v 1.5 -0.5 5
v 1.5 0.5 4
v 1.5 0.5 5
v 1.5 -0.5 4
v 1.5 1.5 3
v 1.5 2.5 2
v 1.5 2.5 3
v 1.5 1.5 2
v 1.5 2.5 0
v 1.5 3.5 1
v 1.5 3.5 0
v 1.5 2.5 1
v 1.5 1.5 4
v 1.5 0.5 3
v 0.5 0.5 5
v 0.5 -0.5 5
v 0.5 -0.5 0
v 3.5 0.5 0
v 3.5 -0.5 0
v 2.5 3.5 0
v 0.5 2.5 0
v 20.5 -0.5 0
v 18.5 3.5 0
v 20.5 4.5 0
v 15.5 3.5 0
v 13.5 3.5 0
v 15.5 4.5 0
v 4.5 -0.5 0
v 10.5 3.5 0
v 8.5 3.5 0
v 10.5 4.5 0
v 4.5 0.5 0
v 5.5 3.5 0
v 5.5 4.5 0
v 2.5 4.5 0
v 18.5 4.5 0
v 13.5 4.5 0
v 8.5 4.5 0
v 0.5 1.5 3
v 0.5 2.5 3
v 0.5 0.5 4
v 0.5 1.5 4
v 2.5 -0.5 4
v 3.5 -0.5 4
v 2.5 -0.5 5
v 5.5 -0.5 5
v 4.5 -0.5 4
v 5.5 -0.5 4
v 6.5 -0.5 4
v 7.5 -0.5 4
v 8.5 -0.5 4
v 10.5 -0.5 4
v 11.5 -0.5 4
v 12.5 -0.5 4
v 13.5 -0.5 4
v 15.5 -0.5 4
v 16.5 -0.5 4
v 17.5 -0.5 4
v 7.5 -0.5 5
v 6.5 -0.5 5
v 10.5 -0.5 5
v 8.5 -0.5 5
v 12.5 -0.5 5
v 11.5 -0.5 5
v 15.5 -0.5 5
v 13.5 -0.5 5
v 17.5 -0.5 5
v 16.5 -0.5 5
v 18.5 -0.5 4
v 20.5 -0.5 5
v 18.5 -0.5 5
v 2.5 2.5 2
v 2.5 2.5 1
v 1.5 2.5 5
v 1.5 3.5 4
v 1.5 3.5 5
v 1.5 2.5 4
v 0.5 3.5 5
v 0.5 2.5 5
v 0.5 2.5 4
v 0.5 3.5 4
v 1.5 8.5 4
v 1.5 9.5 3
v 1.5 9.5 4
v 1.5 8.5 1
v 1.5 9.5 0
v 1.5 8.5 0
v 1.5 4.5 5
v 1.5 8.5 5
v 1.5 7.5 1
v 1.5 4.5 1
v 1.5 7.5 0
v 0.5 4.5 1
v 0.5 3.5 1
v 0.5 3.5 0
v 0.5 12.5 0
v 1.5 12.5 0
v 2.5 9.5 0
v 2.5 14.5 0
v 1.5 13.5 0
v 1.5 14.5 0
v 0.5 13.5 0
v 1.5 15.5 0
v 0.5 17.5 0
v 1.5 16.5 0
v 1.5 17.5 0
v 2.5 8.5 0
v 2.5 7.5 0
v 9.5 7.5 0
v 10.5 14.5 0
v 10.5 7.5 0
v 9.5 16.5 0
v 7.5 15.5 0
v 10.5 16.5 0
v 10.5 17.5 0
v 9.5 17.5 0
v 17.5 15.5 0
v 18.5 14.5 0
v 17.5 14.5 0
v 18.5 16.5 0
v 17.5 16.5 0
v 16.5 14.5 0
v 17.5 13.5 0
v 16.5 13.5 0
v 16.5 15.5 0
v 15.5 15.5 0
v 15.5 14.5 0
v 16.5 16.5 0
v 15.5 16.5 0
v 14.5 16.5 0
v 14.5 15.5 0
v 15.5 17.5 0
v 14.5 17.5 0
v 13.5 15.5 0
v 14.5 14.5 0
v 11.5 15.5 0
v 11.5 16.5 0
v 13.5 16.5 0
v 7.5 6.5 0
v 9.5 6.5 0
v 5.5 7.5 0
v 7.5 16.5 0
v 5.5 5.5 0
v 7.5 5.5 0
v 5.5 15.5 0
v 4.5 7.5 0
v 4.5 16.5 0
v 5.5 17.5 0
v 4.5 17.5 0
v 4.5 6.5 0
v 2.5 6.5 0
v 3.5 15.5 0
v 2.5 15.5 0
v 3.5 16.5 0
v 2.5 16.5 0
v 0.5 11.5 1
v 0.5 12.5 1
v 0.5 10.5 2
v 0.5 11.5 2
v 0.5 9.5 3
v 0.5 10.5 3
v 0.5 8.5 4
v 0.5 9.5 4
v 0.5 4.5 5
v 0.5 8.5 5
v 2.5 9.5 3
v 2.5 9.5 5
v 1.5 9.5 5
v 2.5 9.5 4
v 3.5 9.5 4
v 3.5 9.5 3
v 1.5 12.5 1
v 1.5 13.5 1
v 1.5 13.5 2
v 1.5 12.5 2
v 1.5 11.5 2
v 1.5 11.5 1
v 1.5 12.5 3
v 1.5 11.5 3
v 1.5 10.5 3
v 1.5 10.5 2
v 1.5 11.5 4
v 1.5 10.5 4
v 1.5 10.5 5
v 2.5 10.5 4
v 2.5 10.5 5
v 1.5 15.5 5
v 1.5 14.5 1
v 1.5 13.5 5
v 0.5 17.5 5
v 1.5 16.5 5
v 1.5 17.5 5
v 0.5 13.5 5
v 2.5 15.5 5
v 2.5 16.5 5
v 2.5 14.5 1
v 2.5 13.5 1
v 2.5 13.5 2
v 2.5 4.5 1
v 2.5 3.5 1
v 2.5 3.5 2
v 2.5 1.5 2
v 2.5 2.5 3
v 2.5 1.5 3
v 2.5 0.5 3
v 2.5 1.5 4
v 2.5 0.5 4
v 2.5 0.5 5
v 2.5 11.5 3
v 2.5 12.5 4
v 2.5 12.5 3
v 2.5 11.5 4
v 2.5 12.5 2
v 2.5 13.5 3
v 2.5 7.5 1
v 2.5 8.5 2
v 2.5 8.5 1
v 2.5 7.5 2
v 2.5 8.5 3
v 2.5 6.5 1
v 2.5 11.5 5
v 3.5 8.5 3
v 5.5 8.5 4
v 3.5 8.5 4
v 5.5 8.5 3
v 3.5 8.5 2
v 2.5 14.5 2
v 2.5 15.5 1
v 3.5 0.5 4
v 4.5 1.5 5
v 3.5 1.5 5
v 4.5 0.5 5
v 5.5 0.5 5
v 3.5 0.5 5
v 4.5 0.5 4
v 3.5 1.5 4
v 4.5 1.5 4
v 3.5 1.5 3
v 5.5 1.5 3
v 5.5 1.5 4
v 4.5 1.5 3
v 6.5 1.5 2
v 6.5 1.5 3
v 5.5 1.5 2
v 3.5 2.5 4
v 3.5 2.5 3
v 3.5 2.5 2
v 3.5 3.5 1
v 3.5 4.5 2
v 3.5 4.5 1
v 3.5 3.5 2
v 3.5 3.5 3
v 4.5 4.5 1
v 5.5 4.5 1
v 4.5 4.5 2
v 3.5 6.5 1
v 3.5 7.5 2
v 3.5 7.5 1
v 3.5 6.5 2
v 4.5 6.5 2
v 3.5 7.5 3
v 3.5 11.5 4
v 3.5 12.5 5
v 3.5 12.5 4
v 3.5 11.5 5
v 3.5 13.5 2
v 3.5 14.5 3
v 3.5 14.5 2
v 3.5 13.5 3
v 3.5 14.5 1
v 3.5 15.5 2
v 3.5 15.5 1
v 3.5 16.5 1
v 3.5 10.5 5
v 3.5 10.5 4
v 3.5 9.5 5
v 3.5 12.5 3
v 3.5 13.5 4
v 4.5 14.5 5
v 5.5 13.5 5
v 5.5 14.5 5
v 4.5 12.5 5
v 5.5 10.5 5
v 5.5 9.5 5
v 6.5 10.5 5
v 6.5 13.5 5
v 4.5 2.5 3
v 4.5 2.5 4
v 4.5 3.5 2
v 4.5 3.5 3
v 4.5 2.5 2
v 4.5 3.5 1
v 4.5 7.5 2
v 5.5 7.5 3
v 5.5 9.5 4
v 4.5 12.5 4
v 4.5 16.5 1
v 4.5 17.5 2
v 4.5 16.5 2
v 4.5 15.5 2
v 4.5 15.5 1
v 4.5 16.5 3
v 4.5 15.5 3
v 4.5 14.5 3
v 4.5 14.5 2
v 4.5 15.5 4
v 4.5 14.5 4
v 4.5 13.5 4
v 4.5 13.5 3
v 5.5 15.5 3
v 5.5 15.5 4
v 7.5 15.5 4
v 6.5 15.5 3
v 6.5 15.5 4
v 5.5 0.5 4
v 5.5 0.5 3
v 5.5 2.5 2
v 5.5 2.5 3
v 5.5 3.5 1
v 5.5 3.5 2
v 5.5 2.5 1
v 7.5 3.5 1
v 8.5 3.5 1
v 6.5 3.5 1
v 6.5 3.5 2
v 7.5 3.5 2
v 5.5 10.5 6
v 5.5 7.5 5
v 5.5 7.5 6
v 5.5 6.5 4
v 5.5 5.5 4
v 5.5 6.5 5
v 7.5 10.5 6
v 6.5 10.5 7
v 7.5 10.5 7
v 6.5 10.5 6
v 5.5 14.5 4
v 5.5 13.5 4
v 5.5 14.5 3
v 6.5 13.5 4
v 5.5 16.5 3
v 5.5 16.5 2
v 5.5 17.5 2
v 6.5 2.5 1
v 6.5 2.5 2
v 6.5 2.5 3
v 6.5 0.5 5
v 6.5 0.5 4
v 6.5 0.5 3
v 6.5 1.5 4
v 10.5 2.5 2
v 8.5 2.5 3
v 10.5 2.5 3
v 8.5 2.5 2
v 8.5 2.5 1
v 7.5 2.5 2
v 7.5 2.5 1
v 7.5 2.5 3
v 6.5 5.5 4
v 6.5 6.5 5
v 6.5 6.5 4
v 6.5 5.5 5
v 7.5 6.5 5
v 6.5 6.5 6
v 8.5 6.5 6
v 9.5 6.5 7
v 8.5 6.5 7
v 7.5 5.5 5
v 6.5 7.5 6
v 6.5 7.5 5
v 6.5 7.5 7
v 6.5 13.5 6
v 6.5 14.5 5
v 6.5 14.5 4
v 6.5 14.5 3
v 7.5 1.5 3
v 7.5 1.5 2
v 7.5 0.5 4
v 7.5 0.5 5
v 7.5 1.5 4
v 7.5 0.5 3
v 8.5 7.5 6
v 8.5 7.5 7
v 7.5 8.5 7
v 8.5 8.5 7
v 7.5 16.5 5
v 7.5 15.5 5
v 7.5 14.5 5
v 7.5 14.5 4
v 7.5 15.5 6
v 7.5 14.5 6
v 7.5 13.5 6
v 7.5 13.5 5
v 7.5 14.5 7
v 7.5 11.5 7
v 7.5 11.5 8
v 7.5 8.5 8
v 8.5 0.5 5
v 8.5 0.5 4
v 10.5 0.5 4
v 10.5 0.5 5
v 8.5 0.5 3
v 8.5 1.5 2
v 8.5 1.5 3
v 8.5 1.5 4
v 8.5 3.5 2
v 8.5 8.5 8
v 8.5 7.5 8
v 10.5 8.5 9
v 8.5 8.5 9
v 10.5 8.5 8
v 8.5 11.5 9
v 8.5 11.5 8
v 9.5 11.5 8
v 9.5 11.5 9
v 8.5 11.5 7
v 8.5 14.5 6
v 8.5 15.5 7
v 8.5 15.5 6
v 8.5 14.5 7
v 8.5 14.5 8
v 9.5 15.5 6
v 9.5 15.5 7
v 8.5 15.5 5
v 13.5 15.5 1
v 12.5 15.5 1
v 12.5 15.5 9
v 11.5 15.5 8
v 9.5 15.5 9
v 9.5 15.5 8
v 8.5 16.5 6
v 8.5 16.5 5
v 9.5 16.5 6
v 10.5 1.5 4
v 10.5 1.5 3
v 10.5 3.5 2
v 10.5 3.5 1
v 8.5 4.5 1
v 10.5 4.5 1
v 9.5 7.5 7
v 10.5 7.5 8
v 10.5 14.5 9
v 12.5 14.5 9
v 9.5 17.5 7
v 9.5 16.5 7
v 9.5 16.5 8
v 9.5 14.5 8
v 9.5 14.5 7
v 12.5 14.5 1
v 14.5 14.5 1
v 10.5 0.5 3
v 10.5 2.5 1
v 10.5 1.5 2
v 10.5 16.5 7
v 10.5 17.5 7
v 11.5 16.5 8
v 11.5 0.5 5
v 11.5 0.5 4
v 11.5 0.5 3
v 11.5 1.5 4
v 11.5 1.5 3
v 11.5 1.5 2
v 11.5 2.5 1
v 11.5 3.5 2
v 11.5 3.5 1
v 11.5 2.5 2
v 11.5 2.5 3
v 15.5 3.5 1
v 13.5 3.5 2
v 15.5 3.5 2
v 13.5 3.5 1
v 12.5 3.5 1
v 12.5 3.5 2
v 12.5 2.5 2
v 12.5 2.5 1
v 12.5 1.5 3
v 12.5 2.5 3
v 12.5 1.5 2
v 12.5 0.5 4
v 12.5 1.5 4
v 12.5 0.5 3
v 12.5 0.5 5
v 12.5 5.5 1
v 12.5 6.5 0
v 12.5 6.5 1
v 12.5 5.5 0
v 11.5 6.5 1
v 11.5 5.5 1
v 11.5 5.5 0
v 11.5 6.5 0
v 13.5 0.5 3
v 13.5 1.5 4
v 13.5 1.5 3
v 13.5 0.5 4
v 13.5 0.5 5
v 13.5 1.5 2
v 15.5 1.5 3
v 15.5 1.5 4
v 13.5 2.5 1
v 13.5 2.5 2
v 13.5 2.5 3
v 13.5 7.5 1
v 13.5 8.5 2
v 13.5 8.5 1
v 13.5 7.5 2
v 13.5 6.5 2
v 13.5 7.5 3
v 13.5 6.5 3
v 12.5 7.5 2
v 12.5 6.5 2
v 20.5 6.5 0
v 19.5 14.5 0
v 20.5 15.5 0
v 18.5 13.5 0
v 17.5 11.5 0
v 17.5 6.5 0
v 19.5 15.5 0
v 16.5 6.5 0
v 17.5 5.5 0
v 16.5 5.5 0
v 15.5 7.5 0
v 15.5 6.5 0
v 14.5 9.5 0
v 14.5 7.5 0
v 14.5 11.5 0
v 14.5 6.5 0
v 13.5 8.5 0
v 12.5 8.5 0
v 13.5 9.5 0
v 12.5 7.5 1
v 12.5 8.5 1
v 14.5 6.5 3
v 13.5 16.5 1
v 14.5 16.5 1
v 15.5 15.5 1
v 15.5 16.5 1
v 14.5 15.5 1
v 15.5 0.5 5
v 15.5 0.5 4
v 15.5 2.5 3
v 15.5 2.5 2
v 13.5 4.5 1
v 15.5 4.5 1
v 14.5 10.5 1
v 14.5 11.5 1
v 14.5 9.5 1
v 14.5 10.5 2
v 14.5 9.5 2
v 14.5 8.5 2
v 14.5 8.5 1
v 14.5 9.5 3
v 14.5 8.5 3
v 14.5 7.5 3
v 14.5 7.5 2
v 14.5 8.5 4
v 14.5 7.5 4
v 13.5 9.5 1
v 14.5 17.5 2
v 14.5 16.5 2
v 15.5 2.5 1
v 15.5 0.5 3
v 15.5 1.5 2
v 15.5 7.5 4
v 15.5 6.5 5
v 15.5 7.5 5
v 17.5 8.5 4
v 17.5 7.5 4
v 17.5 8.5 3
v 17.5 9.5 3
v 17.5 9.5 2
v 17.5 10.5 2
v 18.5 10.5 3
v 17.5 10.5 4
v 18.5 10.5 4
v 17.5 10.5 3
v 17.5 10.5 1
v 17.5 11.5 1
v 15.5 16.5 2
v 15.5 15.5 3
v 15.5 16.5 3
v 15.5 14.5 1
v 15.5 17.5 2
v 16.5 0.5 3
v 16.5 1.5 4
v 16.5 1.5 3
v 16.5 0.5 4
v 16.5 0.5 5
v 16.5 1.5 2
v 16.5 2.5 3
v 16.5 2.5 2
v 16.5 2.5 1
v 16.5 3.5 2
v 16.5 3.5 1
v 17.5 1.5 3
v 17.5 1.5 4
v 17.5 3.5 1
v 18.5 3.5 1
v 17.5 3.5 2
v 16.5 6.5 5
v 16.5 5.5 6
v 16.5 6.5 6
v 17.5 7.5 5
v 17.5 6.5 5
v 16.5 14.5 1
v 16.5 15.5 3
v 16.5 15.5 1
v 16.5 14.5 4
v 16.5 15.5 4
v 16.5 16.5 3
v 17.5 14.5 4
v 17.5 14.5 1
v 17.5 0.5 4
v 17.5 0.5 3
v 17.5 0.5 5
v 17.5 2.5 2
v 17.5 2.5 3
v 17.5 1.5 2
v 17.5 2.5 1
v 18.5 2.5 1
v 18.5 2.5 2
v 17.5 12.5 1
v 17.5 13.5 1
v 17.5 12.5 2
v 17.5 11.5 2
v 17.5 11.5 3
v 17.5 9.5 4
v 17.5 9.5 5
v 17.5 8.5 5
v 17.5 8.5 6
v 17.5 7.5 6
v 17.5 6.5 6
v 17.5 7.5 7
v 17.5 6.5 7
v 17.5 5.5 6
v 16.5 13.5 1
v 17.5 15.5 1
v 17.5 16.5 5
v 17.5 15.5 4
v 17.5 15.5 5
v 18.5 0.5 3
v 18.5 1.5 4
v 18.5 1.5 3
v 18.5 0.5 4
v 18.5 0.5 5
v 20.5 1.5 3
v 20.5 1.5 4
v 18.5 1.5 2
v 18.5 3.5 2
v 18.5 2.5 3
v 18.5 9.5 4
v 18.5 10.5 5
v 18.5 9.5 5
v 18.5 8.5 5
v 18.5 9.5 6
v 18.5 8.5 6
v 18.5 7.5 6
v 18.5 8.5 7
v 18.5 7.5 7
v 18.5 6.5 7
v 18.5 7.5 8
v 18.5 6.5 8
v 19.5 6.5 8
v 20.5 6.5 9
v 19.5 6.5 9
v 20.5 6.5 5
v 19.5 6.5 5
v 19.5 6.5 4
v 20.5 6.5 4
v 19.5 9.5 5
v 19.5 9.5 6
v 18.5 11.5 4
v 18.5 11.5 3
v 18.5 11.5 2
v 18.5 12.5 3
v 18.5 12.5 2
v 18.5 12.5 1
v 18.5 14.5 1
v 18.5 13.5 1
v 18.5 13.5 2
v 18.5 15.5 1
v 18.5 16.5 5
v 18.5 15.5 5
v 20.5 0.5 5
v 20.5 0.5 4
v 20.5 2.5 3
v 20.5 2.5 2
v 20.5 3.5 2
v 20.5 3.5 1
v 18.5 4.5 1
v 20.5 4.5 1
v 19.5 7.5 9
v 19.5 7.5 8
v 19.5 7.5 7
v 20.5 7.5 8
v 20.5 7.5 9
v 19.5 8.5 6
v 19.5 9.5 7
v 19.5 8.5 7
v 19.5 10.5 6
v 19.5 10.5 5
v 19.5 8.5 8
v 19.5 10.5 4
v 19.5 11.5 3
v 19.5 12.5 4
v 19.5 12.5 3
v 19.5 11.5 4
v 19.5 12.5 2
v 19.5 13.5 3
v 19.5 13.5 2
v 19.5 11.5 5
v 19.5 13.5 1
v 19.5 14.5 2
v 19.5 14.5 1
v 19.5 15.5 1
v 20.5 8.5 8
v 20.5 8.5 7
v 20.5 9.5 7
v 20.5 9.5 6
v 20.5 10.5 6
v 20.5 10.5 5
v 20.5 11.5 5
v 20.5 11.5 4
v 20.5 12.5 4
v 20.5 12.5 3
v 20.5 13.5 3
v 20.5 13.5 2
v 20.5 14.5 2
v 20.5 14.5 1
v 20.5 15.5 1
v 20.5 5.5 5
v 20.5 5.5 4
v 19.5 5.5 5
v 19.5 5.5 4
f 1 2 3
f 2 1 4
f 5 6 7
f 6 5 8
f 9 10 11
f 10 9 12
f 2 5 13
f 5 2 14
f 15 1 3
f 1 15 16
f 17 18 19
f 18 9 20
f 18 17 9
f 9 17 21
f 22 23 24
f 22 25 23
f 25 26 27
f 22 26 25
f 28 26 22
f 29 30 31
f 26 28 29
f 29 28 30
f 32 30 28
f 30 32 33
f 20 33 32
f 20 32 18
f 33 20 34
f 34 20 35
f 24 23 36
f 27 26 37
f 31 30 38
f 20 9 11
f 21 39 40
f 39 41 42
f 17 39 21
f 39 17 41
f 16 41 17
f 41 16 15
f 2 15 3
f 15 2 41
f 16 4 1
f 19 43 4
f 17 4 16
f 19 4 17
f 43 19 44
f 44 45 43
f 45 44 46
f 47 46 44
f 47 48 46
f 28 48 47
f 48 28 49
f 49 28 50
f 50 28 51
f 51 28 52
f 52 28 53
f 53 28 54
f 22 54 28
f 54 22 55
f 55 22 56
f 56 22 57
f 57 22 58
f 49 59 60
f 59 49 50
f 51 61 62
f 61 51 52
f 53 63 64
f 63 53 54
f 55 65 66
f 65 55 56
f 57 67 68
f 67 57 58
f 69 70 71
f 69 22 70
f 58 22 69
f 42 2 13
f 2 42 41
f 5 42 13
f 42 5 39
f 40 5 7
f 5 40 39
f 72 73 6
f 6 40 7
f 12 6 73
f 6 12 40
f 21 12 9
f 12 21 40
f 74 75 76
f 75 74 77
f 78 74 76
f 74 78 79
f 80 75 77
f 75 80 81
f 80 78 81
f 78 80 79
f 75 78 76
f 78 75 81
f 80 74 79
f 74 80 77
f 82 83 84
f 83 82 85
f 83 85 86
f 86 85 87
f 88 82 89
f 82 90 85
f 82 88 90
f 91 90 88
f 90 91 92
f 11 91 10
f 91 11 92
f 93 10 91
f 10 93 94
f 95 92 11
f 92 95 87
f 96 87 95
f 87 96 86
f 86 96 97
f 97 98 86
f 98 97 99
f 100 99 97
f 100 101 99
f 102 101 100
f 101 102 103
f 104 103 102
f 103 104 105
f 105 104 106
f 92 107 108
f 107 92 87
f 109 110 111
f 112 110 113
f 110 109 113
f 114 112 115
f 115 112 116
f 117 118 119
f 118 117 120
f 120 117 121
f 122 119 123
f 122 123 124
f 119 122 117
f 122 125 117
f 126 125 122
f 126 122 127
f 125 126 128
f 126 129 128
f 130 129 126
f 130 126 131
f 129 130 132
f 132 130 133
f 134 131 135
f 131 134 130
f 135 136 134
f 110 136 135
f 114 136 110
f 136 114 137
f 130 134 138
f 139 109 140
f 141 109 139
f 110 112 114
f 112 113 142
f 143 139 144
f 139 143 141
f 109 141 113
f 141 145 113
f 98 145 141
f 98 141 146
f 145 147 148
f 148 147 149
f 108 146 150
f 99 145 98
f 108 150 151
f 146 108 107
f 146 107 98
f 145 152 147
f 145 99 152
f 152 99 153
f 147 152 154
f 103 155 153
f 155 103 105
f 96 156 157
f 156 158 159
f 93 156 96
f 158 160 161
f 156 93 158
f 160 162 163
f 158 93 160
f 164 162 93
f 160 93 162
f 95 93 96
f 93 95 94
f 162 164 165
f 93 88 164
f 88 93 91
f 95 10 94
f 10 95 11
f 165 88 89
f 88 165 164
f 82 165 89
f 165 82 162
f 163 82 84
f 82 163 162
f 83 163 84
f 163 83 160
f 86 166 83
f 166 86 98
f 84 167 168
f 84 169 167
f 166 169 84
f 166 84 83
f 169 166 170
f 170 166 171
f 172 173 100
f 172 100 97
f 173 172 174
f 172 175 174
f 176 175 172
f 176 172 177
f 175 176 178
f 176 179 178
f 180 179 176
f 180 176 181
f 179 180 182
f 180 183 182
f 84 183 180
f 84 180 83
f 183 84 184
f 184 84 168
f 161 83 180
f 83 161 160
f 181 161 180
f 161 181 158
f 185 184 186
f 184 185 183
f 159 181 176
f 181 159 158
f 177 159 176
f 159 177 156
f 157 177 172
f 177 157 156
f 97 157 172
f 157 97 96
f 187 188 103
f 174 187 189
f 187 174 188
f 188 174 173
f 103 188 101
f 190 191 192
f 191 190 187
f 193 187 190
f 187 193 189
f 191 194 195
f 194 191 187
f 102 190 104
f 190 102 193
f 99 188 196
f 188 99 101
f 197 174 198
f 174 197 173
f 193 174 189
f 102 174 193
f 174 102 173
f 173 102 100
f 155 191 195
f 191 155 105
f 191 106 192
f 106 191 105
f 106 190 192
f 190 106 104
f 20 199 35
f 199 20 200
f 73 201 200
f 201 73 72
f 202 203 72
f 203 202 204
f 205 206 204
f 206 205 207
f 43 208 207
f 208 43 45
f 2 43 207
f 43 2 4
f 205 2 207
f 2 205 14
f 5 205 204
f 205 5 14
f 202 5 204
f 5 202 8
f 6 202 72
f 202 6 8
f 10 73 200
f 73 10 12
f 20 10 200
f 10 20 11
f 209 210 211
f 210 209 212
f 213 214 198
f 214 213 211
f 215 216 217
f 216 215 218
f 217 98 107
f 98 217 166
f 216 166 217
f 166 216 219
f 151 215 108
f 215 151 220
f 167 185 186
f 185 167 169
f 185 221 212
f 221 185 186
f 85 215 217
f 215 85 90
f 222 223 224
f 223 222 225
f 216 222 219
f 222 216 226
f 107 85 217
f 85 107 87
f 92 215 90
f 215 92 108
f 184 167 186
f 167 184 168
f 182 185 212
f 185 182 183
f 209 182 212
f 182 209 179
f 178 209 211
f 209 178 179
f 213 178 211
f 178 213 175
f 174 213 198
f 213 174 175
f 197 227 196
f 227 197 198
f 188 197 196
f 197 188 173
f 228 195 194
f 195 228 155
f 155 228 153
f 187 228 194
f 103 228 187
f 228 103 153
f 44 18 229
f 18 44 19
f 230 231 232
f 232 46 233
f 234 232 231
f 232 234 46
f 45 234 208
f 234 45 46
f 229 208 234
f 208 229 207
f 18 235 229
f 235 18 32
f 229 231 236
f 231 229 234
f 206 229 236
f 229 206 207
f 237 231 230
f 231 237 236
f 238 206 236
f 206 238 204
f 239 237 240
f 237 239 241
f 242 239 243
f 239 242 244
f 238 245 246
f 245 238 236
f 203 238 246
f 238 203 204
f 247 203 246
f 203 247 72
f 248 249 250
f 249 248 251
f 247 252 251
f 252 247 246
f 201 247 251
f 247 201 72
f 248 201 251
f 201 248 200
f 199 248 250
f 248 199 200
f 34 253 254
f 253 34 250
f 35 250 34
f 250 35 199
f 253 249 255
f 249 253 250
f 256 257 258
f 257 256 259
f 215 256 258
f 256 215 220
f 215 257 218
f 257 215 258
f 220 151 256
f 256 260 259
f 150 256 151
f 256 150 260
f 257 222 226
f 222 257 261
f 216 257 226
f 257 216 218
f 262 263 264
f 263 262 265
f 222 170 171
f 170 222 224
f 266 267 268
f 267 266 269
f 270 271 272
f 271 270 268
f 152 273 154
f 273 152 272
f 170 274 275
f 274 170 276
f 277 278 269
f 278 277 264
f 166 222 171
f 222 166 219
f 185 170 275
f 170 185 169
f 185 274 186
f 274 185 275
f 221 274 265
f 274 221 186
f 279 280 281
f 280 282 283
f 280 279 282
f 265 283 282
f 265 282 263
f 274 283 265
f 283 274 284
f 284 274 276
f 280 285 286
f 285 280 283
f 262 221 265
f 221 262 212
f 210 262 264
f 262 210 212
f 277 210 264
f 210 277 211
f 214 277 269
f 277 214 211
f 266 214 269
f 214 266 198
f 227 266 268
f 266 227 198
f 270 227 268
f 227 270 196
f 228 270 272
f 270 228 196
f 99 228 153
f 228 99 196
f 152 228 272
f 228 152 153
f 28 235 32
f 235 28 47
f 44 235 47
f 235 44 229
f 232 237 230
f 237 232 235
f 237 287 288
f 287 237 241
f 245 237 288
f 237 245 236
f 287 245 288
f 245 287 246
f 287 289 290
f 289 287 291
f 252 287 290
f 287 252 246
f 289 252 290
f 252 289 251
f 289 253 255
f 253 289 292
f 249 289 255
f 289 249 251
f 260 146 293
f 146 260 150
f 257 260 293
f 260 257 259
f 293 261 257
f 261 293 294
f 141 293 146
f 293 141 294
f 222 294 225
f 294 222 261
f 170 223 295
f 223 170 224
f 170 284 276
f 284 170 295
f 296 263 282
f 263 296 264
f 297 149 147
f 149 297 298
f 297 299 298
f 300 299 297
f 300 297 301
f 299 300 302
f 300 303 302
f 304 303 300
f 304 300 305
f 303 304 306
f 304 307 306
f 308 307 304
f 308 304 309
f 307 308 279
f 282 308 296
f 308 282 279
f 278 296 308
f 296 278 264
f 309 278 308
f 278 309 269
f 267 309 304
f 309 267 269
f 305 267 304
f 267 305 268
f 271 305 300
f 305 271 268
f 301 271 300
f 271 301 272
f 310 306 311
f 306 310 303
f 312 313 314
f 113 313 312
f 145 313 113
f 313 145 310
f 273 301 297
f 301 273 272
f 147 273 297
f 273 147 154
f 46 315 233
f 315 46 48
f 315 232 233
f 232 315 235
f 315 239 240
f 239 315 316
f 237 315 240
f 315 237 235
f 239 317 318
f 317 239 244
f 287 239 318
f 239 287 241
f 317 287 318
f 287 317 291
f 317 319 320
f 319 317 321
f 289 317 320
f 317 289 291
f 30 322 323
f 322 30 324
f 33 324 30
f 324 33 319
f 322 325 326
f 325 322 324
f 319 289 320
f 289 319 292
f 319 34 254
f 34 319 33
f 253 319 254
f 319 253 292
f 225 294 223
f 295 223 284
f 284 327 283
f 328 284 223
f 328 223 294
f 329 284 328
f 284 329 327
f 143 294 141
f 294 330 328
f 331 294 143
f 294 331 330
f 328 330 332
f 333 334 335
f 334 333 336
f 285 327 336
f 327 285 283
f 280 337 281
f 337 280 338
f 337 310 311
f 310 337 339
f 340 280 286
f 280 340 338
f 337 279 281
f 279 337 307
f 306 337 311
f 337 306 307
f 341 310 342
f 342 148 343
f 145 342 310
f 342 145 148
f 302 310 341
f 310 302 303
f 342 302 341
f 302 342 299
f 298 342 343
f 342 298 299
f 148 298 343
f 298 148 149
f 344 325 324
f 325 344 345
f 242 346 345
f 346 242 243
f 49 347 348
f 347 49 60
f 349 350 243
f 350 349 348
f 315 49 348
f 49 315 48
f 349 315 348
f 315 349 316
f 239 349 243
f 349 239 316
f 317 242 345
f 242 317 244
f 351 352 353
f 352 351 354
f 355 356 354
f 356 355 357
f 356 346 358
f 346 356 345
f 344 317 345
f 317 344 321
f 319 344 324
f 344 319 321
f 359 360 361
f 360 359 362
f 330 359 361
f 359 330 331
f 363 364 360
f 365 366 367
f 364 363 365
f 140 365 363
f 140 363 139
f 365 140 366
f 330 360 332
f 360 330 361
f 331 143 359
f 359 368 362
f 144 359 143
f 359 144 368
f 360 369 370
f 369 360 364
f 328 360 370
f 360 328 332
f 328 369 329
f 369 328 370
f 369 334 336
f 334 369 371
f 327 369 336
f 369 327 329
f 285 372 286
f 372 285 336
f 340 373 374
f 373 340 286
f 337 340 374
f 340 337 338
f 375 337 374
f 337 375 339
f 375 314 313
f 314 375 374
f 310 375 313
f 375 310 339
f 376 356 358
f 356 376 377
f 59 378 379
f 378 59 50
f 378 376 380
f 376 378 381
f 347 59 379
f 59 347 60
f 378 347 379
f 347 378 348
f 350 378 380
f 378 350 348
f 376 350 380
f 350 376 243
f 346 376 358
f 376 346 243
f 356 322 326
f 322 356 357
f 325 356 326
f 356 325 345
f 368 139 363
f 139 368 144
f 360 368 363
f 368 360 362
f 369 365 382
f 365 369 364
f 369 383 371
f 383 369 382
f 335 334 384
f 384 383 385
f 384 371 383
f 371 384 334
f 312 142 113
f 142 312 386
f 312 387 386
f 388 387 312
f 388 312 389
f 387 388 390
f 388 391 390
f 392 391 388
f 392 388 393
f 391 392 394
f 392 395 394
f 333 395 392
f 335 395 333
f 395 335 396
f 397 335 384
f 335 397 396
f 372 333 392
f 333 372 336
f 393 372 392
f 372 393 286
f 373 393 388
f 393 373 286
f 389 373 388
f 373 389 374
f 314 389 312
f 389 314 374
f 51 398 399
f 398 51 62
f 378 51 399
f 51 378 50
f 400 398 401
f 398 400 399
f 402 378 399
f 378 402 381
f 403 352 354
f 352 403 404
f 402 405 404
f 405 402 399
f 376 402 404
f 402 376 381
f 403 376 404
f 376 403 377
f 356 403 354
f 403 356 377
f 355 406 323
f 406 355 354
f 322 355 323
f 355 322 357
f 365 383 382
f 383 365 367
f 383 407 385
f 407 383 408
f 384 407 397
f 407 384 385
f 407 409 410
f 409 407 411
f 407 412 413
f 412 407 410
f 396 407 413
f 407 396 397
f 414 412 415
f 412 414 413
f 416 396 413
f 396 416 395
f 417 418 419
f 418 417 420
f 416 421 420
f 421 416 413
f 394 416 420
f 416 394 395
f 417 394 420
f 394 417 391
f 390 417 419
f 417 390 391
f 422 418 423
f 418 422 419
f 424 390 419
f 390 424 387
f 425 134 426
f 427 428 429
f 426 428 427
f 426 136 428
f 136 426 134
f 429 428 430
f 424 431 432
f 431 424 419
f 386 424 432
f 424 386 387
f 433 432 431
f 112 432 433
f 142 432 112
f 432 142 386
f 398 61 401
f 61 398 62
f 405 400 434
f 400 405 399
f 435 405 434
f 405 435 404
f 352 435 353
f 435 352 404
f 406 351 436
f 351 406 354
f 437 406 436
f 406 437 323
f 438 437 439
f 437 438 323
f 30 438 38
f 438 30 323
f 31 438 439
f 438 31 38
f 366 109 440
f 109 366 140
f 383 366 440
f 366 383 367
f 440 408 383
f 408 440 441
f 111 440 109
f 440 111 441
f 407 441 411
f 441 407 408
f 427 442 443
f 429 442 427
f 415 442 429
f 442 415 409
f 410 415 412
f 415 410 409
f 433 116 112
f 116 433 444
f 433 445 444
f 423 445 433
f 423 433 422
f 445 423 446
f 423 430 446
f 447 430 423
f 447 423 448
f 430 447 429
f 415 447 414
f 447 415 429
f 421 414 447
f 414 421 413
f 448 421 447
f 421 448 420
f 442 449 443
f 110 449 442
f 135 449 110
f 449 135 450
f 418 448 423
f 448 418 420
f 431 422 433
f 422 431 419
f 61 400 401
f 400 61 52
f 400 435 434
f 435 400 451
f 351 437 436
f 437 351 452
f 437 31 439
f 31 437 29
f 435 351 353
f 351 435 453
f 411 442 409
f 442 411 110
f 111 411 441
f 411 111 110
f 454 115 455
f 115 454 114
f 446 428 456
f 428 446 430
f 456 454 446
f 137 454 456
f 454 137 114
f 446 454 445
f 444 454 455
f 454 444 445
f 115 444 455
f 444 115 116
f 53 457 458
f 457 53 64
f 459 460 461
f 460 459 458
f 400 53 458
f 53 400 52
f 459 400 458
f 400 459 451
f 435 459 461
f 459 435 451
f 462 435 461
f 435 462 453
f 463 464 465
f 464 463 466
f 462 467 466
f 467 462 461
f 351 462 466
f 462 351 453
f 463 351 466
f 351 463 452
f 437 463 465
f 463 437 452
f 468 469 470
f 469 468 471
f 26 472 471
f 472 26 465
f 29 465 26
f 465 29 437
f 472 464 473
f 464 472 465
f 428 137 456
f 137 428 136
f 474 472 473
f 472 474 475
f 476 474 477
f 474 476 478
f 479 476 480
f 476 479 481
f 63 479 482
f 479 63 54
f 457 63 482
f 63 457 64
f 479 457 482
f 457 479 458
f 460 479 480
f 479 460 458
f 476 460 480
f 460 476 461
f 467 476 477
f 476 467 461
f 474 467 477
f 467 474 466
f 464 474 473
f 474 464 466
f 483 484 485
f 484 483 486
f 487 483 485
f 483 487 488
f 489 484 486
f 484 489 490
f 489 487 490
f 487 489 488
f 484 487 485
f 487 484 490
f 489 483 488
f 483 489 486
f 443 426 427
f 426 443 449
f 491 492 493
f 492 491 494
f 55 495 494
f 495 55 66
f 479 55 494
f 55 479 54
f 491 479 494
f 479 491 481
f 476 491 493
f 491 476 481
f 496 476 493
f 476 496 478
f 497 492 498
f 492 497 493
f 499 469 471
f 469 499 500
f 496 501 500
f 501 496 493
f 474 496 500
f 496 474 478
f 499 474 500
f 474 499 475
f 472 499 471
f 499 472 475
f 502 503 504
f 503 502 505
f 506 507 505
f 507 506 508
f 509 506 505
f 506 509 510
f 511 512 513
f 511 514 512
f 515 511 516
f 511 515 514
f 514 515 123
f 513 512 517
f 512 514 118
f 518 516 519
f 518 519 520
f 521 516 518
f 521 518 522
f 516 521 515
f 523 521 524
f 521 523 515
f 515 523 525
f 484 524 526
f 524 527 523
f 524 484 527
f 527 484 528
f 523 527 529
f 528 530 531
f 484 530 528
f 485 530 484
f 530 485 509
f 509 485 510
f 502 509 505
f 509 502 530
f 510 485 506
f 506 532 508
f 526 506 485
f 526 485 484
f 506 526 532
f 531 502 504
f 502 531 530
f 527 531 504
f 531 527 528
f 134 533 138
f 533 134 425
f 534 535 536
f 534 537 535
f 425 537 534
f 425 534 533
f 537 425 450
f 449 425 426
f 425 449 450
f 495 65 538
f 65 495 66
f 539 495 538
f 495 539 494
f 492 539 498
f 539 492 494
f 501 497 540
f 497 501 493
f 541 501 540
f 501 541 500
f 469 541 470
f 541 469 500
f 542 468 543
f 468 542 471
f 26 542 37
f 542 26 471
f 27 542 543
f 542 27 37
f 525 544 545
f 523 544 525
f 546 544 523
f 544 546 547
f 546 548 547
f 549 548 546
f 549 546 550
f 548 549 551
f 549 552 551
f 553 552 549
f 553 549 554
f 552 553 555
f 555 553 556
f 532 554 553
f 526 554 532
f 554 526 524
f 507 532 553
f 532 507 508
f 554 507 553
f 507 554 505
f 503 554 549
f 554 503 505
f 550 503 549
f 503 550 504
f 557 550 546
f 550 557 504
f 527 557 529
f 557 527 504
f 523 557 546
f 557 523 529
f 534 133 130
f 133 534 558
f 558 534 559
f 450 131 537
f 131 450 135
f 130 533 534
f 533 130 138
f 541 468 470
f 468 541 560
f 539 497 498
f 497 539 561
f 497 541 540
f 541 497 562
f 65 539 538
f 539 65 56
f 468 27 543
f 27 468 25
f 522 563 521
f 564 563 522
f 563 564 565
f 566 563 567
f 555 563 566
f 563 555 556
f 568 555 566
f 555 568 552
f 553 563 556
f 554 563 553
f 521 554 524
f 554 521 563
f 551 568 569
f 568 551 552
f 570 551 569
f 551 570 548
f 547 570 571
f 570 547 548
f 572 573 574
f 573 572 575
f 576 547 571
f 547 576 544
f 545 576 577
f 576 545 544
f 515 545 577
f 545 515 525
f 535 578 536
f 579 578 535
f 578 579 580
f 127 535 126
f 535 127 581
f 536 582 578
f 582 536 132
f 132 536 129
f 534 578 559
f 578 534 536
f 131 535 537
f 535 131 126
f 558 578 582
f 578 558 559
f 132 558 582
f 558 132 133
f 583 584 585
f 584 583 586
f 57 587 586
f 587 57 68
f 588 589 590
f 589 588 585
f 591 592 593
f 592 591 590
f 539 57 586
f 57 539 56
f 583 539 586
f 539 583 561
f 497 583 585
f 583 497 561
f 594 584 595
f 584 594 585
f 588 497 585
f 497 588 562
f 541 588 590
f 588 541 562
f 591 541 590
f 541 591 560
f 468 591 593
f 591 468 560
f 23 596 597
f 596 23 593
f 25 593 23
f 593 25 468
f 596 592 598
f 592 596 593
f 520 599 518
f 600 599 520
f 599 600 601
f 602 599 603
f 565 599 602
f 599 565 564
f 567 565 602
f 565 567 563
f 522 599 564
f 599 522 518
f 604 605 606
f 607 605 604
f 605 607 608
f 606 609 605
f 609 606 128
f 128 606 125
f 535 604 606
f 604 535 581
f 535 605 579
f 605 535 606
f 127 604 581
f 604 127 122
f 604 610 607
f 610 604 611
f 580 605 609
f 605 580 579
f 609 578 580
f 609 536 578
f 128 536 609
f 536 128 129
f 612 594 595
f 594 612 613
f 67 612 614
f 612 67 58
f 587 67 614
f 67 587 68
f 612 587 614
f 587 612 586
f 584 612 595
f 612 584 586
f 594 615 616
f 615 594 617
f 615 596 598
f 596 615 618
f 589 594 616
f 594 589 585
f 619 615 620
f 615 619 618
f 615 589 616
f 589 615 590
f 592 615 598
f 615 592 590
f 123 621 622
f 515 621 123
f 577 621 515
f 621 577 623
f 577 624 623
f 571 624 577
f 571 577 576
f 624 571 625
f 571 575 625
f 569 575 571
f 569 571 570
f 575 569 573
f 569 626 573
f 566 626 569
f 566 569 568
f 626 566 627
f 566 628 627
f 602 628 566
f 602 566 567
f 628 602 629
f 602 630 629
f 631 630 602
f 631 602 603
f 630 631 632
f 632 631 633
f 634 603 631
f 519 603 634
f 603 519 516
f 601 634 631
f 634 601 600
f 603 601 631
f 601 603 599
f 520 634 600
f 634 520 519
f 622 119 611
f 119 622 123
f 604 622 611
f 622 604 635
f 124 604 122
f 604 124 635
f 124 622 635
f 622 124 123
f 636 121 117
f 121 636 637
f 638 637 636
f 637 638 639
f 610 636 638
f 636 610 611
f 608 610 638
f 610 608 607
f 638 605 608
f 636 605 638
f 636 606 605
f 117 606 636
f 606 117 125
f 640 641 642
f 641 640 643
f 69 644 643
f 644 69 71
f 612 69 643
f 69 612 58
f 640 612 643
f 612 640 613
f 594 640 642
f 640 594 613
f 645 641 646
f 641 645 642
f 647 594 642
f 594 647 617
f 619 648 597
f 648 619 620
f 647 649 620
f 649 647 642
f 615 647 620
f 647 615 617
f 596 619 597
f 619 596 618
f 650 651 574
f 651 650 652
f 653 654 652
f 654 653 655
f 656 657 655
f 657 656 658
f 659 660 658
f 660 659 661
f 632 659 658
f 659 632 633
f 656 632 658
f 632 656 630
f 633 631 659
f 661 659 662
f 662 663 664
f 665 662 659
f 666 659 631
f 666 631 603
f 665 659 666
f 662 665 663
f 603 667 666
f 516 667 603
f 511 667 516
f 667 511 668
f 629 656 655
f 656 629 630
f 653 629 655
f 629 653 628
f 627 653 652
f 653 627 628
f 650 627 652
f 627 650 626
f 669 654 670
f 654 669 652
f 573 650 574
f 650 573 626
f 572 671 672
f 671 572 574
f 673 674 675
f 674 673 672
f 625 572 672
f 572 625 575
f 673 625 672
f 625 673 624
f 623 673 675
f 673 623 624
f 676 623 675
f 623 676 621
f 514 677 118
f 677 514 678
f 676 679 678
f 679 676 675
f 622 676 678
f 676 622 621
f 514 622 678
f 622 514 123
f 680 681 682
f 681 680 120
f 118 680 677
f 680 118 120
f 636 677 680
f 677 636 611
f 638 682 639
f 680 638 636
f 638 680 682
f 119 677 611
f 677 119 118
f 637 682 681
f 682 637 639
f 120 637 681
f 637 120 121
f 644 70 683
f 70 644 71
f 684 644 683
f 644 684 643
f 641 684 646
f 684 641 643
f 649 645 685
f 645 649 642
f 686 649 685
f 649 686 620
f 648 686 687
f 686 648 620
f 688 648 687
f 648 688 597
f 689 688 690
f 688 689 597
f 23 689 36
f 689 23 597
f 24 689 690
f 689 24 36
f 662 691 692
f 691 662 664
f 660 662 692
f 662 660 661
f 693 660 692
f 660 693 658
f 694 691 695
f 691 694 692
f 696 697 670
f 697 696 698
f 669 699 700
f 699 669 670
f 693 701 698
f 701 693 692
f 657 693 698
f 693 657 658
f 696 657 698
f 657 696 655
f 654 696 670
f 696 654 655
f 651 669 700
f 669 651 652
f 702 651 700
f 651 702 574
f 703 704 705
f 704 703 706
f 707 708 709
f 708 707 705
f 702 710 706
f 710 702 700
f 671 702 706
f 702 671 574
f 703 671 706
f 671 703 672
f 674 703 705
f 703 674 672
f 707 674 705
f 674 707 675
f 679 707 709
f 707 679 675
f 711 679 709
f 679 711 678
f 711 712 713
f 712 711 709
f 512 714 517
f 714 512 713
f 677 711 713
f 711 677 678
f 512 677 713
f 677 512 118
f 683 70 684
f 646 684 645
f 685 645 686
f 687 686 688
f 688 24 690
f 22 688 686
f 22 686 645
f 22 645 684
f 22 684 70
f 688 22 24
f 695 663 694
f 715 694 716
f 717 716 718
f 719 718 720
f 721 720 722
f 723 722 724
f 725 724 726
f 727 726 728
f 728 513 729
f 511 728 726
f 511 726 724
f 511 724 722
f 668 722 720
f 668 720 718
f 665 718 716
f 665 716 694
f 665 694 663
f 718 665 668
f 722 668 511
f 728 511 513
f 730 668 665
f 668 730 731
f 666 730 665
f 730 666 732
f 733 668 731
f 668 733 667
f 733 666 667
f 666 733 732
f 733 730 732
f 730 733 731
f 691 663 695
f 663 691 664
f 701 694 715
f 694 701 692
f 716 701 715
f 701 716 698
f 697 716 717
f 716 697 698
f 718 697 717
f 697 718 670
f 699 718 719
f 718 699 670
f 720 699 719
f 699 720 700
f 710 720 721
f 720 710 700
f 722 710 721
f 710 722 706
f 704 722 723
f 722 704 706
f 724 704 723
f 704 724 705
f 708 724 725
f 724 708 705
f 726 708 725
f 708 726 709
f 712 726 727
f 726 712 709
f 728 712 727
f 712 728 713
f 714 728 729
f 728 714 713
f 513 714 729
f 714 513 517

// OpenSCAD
union() {
    translate([1, 0, 2.5]) cube([1, 1, 5], center=true);
    translate([1, 1, 2.0]) cube([1, 1, 4], center=true);
    translate([1, 2, 1.5]) cube([1, 1, 3], center=true);
    translate([1, 3, 4.5]) color([1, 0, 0]) cube([1, 1, 1], center=true);
    translate([1, 4, 0.5]) cube([1, 1, 1], center=true);
    translate([1, 5, 2.5]) cube([1, 1, 5], center=true);
    translate([1, 6, 2.5]) cube([1, 1, 5], center=true);
    translate([1, 7, 2.5]) cube([1, 1, 5], center=true);
    translate([1, 8, 2.5]) cube([1, 1, 5], center=true);
    translate([1, 9, 2.0]) cube([1, 1, 4], center=true);
    translate([1, 10, 1.5]) cube([1, 1, 3], center=true);
    translate([1, 11, 1.0]) cube([1, 1, 2], center=true);
    translate([1, 12, 0.5]) cube([1, 1, 1], center=true);
    translate([1, 14, 2.5]) cube([1, 1, 5], center=true);
    translate([1, 15, 2.5]) cube([1, 1, 5], center=true);
    translate([1, 16, 2.5]) cube([1, 1, 5], center=true);
    translate([1, 17, 2.5]) cube([1, 1, 5], center=true);
    translate([2, 0, 2.0]) cube([1, 1, 4], center=true);
    translate([2, 1, 1.5]) cube([1, 1, 3], center=true);
    translate([2, 2, 1.0]) cube([1, 1, 2], center=true);
    translate([2, 3, 0.5]) cube([1, 1, 1], center=true);
    translate([2, 8, 0.5]) cube([1, 1, 1], center=true);
    translate([2, 10, 2.5]) cube([1, 1, 5], center=true);
    translate([2, 11, 2.0]) cube([1, 1, 4], center=true);
    translate([2, 12, 1.5]) cube([1, 1, 3], center=true);
    translate([2, 13, 1.0]) cube([1, 1, 2], center=true);
    translate([2, 14, 0.5]) cube([1, 1, 1], center=true);
    translate([2, 16, 2.5]) cube([1, 1, 5], center=true);
    translate([3, 0, 2.5]) cube([1, 1, 5], center=true);
    translate([3, 1, 2.0]) cube([1, 1, 4], center=true);
    translate([3, 2, 1.5]) cube([1, 1, 3], center=true);
    translate([3, 3, 1.0]) cube([1, 1, 2], center=true);
    translate([3, 4, 0.5]) cube([1, 1, 1], center=true);
    translate([3, 7, 0.5]) cube([1, 1, 1], center=true);
    translate([3, 8, 1.0]) cube([1, 1, 2], center=true);
    translate([3, 9, 1.5]) cube([1, 1, 3], center=true);
    translate([3, 10, 2.0]) cube([1, 1, 4], center=true);
    translate([3, 11, 2.5]) cube([1, 1, 5], center=true);
    translate([3, 12, 2.0]) cube([1, 1, 4], center=true);
    translate([3, 13, 1.5]) cube([1, 1, 3], center=true);
    translate([3, 14, 1.0]) cube([1, 1, 2], center=true);
    translate([3, 15, 0.5]) cube([1, 1, 1], center=true);
    translate([4, 0, 4.5]) color([1, 0, 0]) cube([1, 1, 1], center=true);
    translate([4, 1, 2.5]) cube([1, 1, 5], center=true);
    translate([4, 2, 2.0]) cube([1, 1, 4], center=true);
    translate([4, 3, 1.5]) cube([1, 1, 3], center=true);
    translate([4, 4, 1.0]) cube([1, 1, 2], center=true);
    translate([4, 7, 1.0]) cube([1, 1, 2], center=true);
    translate([4, 8, 1.5]) cube([1, 1, 3], center=true);
    translate([4, 9, 2.0]) cube([1, 1, 4], center=true);
    translate([4, 10, 2.5]) cube([1, 1, 5], center=true);
    translate([4, 11, 2.5]) cube([1, 1, 5], center=true);
    translate([4, 12, 2.5]) cube([1, 1, 5], center=true);
    translate([4, 13, 2.0]) cube([1, 1, 4], center=true);
    translate([4, 14, 1.5]) cube([1, 1, 3], center=true);
    translate([4, 15, 1.0]) cube([1, 1, 2], center=true);
    translate([4, 16, 0.5]) cube([1, 1, 1], center=true);
    translate([5, 0, 2.5]) cube([1, 1, 5], center=true);
    translate([5, 1, 2.0]) cube([1, 1, 4], center=true);
    translate([5, 2, 1.5]) cube([1, 1, 3], center=true);
    translate([5, 3, 1.0]) cube([1, 1, 2], center=true);
    translate([5, 4, 0.5]) cube([1, 1, 1], center=true);
    translate([5, 8, 1.5]) cube([1, 1, 3], center=true);
    translate([5, 9, 2.0]) cube([1, 1, 4], center=true);
    translate([5, 10, 2.5]) cube([1, 1, 5], center=true);
    translate([5, 11, 2.5]) cube([1, 1, 5], center=true);
    translate([5, 12, 2.5]) cube([1, 1, 5], center=true);
    translate([5, 13, 2.5]) cube([1, 1, 5], center=true);
    translate([5, 14, 2.5]) cube([1, 1, 5], center=true);
    translate([5, 15, 2.0]) cube([1, 1, 4], center=true);
    translate([5, 16, 1.5]) cube([1, 1, 3], center=true);
    translate([5, 17, 1.0]) cube([1, 1, 2], center=true);
    translate([6, 0, 2.0]) cube([1, 1, 4], center=true);
    translate([6, 1, 1.5]) cube([1, 1, 3], center=true);
    translate([6, 2, 1.0]) cube([1, 1, 2], center=true);
    translate([6, 3, 0.5]) cube([1, 1, 1], center=true);
    translate([6, 6, 2.0]) cube([1, 1, 4], center=true);
    translate([6, 7, 2.5]) cube([1, 1, 5], center=true);
    translate([6, 8, 3.0]) cube([1, 1, 6], center=true);
    translate([6, 9, 3.0]) cube([1, 1, 6], center=true);
    translate([6, 10, 3.0]) cube([1, 1, 6], center=true);
    translate([6, 11, 2.5]) cube([1, 1, 5], center=true);
    translate([6, 12, 2.5]) cube([1, 1, 5], center=true);
    translate([6, 13, 2.5]) cube([1, 1, 5], center=true);
    translate([6, 14, 2.0]) cube([1, 1, 4], center=true);
    translate([6, 15, 1.5]) cube([1, 1, 3], center=true);
    translate([7, 0, 2.5]) cube([1, 1, 5], center=true);
    translate([7, 1, 2.0]) cube([1, 1, 4], center=true);
    translate([7, 2, 1.5]) cube([1, 1, 3], center=true);
    translate([7, 3, 1.0]) cube([1, 1, 2], center=true);
    translate([7, 6, 2.5]) cube([1, 1, 5], center=true);
    translate([7, 7, 3.0]) cube([1, 1, 6], center=true);
    translate([7, 8, 3.5]) cube([1, 1, 7], center=true);
    translate([7, 9, 3.5]) cube([1, 1, 7], center=true);
    translate([7, 10, 3.5]) cube([1, 1, 7], center=true);
    translate([7, 11, 3.0]) cube([1, 1, 6], center=true);
    translate([7, 12, 3.0]) cube([1, 1, 6], center=true);
    translate([7, 13, 3.0]) cube([1, 1, 6], center=true);
    translate([7, 14, 2.5]) cube([1, 1, 5], center=true);
    translate([7, 15, 2.0]) cube([1, 1, 4], center=true);
    translate([8, 0, 2.0]) cube([1, 1, 4], center=true);
    translate([8, 1, 1.5]) cube([1, 1, 3], center=true);
    translate([8, 2, 1.0]) cube([1, 1, 2], center=true);
    translate([8, 3, 0.5]) cube([1, 1, 1], center=true);
    translate([8, 7, 3.0]) cube([1, 1, 6], center=true);
    translate([8, 8, 3.5]) cube([1, 1, 7], center=true);
    translate([8, 9, 4.0]) cube([1, 1, 8], center=true);
    translate([8, 10, 4.0]) cube([1, 1, 8], center=true);
    translate([8, 11, 4.0]) cube([1, 1, 8], center=true);
    translate([8, 12, 3.5]) cube([1, 1, 7], center=true);
    translate([8, 13, 3.5]) cube([1, 1, 7], center=true);
    translate([8, 14, 3.5]) cube([1, 1, 7], center=true);
    translate([8, 15, 3.0]) cube([1, 1, 6], center=true);
    translate([8, 16, 2.5]) cube([1, 1, 5], center=true);
    translate([9, 0, 2.5]) cube([1, 1, 5], center=true);
    translate([9, 1, 2.0]) cube([1, 1, 4], center=true);
    translate([9, 2, 1.5]) cube([1, 1, 3], center=true);
    translate([9, 3, 1.0]) cube([1, 1, 2], center=true);
    translate([9, 4, 0.5]) cube([1, 1, 1], center=true);
    translate([9, 7, 3.5]) cube([1, 1, 7], center=true);
    translate([9, 8, 4.0]) cube([1, 1, 8], center=true);
    translate([9, 9, 4.5]) cube([1, 1, 9], center=true);
    translate([9, 10, 4.5]) cube([1, 1, 9], center=true);
    translate([9, 11, 4.5]) cube([1, 1, 9], center=true);
    translate([9, 12, 4.0]) cube([1, 1, 8], center=true);
    translate([9, 13, 4.0]) cube([1, 1, 8], center=true);
    translate([9, 14, 4.0]) cube([1, 1, 8], center=true);
    translate([9, 15, 3.5]) cube([1, 1, 7], center=true);
    translate([9, 16, 3.0]) cube([1, 1, 6], center=true);
    translate([10, 0, 2.5]) cube([1, 1, 5], center=true);
    translate([10, 1, 2.0]) cube([1, 1, 4], center=true);
    translate([10, 2, 1.5]) cube([1, 1, 3], center=true);
    translate([10, 3, 1.0]) cube([1, 1, 2], center=true);
    translate([10, 4, 0.5]) cube([1, 1, 1], center=true);
    translate([10, 8, 4.0]) cube([1, 1, 8], center=true);
    translate([10, 9, 4.5]) cube([1, 1, 9], center=true);
    translate([10, 10, 4.5]) cube([1, 1, 9], center=true);
    translate([10, 11, 4.5]) cube([1, 1, 9], center=true);
    translate([10, 12, 4.5]) cube([1, 1, 9], center=true);
    translate([10, 13, 4.5]) cube([1, 1, 9], center=true);
    translate([10, 14, 4.5]) cube([1, 1, 9], center=true);
    translate([10, 15, 4.5]) cube([1, 1, 9], center=true);
    translate([10, 16, 4.0]) cube([1, 1, 8], center=true);
    translate([10, 17, 3.5]) cube([1, 1, 7], center=true);
    translate([11, 0, 2.0]) cube([1, 1, 4], center=true);
    translate([11, 1, 1.5]) cube([1, 1, 3], center=true);
    translate([11, 2, 1.0]) cube([1, 1, 2], center=true);
    translate([11, 3, 0.5]) cube([1, 1, 1], center=true);
    translate([11, 15, 4.5]) cube([1, 1, 9], center=true);
    translate([11, 16, 4.0]) cube([1, 1, 8], center=true);
    translate([12, 0, 2.5]) cube([1, 1, 5], center=true);
    translate([12, 1, 2.0]) cube([1, 1, 4], center=true);
    translate([12, 2, 1.5]) cube([1, 1, 3], center=true);
    translate([12, 3, 1.0]) cube([1, 1, 2], center=true);
    translate([12, 6, 0.5]) cube([1, 1, 1], center=true);
    translate([12, 15, 4.5]) cube([1, 1, 9], center=true);
    translate([13, 0, 2.0]) cube([1, 1, 4], center=true);
    translate([13, 1, 1.5]) cube([1, 1, 3], center=true);
    translate([13, 2, 1.0]) cube([1, 1, 2], center=true);
    translate([13, 3, 0.5]) cube([1, 1, 1], center=true);
    translate([13, 7, 1.0]) cube([1, 1, 2], center=true);
    translate([13, 8, 0.5]) cube([1, 1, 1], center=true);
    translate([13, 15, 0.5]) cube([1, 1, 1], center=true);
    translate([14, 0, 2.5]) cube([1, 1, 5], center=true);
    translate([14, 1, 2.0]) cube([1, 1, 4], center=true);
    translate([14, 2, 1.5]) cube([1, 1, 3], center=true);
    translate([14, 3, 1.0]) cube([1, 1, 2], center=true);
    translate([14, 4, 0.5]) cube([1, 1, 1], center=true);
    translate([14, 7, 1.5]) cube([1, 1, 3], center=true);
    translate([14, 8, 1.0]) cube([1, 1, 2], center=true);
    translate([14, 9, 0.5]) cube([1, 1, 1], center=true);
    translate([14, 15, 0.5]) cube([1, 1, 1], center=true);
    translate([14, 16, 0.5]) cube([1, 1, 1], center=true);
    translate([15, 0, 2.5]) cube([1, 1, 5], center=true);
    translate([15, 1, 2.0]) cube([1, 1, 4], center=true);
    translate([15, 2, 1.5]) cube([1, 1, 3], center=true);
    translate([15, 3, 1.0]) cube([1, 1, 2], center=true);
    translate([15, 4, 0.5]) cube([1, 1, 1], center=true);
    translate([15, 8, 2.0]) cube([1, 1, 4], center=true);
    translate([15, 9, 1.5]) cube([1, 1, 3], center=true);
    translate([15, 10, 1.0]) cube([1, 1, 2], center=true);
    translate([15, 11, 0.5]) cube([1, 1, 1], center=true);
    translate([15, 16, 0.5]) cube([1, 1, 1], center=true);
    translate([15, 17, 1.0]) cube([1, 1, 2], center=true);
    translate([16, 0, 2.0]) cube([1, 1, 4], center=true);
    translate([16, 1, 1.5]) cube([1, 1, 3], center=true);
    translate([16, 2, 1.0]) cube([1, 1, 2], center=true);
    translate([16, 3, 0.5]) cube([1, 1, 1], center=true);
    translate([16, 7, 2.5]) cube([1, 1, 5], center=true);
    translate([16, 8, 2.0]) cube([1, 1, 4], center=true);
    translate([16, 9, 1.5]) cube([1, 1, 3], center=true);
    translate([16, 10, 1.0]) cube([1, 1, 2], center=true);
    translate([16, 11, 0.5]) cube([1, 1, 1], center=true);
    translate([16, 15, 0.5]) cube([1, 1, 1], center=true);
    translate([16, 16, 1.5]) cube([1, 1, 3], center=true);
    translate([17, 0, 2.5]) cube([1, 1, 5], center=true);
    translate([17, 1, 2.0]) cube([1, 1, 4], center=true);
    translate([17, 2, 1.5]) cube([1, 1, 3], center=true);
    translate([17, 3, 1.0]) cube([1, 1, 2], center=true);
    translate([17, 6, 3.0]) cube([1, 1, 6], center=true);
    translate([17, 7, 2.5]) cube([1, 1, 5], center=true);
    translate([17, 8, 2.0]) cube([1, 1, 4], center=true);
    translate([17, 9, 1.5]) cube([1, 1, 3], center=true);
    translate([17, 10, 1.0]) cube([1, 1, 2], center=true);
    translate([17, 11, 0.5]) cube([1, 1, 1], center=true);
    translate([17, 14, 0.5]) cube([1, 1, 1], center=true);
    translate([17, 15, 2.0]) cube([1, 1, 4], center=true);
    translate([18, 0, 2.0]) cube([1, 1, 4], center=true);
    translate([18, 1, 1.5]) cube([1, 1, 3], center=true);
    translate([18, 2, 1.0]) cube([1, 1, 2], center=true);
    translate([18, 3, 0.5]) cube([1, 1, 1], center=true);
    translate([18, 7, 3.5]) cube([1, 1, 7], center=true);
    translate([18, 8, 3.0]) cube([1, 1, 6], center=true);
    translate([18, 9, 2.5]) cube([1, 1, 5], center=true);
    translate([18, 10, 2.0]) cube([1, 1, 4], center=true);
    translate([18, 11, 1.5]) cube([1, 1, 3], center=true);
    translate([18, 12, 1.0]) cube([1, 1, 2], center=true);
    translate([18, 13, 0.5]) cube([1, 1, 1], center=true);
    translate([18, 15, 0.5]) cube([1, 1, 1], center=true);
    translate([18, 16, 2.5]) cube([1, 1, 5], center=true);
    translate([19, 0, 2.5]) cube([1, 1, 5], center=true);
    translate([19, 1, 2.0]) cube([1, 1, 4], center=true);
    translate([19, 2, 1.5]) cube([1, 1, 3], center=true);
    translate([19, 3, 1.0]) cube([1, 1, 2], center=true);
    translate([19, 4, 0.5]) cube([1, 1, 1], center=true);
    translate([19, 7, 4.0]) cube([1, 1, 8], center=true);
    translate([19, 8, 3.5]) cube([1, 1, 7], center=true);
    translate([19, 9, 3.0]) cube([1, 1, 6], center=true);
    translate([19, 10, 2.5]) cube([1, 1, 5], center=true);
    translate([19, 11, 2.0]) cube([1, 1, 4], center=true);
    translate([19, 12, 1.5]) cube([1, 1, 3], center=true);
    translate([19, 13, 1.0]) cube([1, 1, 2], center=true);
    translate([19, 14, 0.5]) cube([1, 1, 1], center=true);
    translate([20, 0, 2.5]) cube([1, 1, 5], center=true);
    translate([20, 1, 2.0]) cube([1, 1, 4], center=true);
    translate([20, 2, 1.5]) cube([1, 1, 3], center=true);
    translate([20, 3, 1.0]) cube([1, 1, 2], center=true);
    translate([20, 4, 0.5]) cube([1, 1, 1], center=true);
    translate([20, 6, 4.5]) color([0, 0, 1]) cube([1, 1, 1], center=true);
    translate([20, 7, 4.5]) cube([1, 1, 9], center=true);
    translate([20, 8, 4.0]) cube([1, 1, 8], center=true);
    translate([20, 9, 3.5]) cube([1, 1, 7], center=true);
    translate([20, 10, 3.0]) cube([1, 1, 6], center=true);
    translate([20, 11, 2.5]) cube([1, 1, 5], center=true);
    translate([20, 12, 2.0]) cube([1, 1, 4], center=true);
    translate([20, 13, 1.5]) cube([1, 1, 3], center=true);
    translate([20, 14, 1.0]) cube([1, 1, 2], center=true);
    translate([20, 15, 0.5]) cube([1, 1, 1], center=true);
}
